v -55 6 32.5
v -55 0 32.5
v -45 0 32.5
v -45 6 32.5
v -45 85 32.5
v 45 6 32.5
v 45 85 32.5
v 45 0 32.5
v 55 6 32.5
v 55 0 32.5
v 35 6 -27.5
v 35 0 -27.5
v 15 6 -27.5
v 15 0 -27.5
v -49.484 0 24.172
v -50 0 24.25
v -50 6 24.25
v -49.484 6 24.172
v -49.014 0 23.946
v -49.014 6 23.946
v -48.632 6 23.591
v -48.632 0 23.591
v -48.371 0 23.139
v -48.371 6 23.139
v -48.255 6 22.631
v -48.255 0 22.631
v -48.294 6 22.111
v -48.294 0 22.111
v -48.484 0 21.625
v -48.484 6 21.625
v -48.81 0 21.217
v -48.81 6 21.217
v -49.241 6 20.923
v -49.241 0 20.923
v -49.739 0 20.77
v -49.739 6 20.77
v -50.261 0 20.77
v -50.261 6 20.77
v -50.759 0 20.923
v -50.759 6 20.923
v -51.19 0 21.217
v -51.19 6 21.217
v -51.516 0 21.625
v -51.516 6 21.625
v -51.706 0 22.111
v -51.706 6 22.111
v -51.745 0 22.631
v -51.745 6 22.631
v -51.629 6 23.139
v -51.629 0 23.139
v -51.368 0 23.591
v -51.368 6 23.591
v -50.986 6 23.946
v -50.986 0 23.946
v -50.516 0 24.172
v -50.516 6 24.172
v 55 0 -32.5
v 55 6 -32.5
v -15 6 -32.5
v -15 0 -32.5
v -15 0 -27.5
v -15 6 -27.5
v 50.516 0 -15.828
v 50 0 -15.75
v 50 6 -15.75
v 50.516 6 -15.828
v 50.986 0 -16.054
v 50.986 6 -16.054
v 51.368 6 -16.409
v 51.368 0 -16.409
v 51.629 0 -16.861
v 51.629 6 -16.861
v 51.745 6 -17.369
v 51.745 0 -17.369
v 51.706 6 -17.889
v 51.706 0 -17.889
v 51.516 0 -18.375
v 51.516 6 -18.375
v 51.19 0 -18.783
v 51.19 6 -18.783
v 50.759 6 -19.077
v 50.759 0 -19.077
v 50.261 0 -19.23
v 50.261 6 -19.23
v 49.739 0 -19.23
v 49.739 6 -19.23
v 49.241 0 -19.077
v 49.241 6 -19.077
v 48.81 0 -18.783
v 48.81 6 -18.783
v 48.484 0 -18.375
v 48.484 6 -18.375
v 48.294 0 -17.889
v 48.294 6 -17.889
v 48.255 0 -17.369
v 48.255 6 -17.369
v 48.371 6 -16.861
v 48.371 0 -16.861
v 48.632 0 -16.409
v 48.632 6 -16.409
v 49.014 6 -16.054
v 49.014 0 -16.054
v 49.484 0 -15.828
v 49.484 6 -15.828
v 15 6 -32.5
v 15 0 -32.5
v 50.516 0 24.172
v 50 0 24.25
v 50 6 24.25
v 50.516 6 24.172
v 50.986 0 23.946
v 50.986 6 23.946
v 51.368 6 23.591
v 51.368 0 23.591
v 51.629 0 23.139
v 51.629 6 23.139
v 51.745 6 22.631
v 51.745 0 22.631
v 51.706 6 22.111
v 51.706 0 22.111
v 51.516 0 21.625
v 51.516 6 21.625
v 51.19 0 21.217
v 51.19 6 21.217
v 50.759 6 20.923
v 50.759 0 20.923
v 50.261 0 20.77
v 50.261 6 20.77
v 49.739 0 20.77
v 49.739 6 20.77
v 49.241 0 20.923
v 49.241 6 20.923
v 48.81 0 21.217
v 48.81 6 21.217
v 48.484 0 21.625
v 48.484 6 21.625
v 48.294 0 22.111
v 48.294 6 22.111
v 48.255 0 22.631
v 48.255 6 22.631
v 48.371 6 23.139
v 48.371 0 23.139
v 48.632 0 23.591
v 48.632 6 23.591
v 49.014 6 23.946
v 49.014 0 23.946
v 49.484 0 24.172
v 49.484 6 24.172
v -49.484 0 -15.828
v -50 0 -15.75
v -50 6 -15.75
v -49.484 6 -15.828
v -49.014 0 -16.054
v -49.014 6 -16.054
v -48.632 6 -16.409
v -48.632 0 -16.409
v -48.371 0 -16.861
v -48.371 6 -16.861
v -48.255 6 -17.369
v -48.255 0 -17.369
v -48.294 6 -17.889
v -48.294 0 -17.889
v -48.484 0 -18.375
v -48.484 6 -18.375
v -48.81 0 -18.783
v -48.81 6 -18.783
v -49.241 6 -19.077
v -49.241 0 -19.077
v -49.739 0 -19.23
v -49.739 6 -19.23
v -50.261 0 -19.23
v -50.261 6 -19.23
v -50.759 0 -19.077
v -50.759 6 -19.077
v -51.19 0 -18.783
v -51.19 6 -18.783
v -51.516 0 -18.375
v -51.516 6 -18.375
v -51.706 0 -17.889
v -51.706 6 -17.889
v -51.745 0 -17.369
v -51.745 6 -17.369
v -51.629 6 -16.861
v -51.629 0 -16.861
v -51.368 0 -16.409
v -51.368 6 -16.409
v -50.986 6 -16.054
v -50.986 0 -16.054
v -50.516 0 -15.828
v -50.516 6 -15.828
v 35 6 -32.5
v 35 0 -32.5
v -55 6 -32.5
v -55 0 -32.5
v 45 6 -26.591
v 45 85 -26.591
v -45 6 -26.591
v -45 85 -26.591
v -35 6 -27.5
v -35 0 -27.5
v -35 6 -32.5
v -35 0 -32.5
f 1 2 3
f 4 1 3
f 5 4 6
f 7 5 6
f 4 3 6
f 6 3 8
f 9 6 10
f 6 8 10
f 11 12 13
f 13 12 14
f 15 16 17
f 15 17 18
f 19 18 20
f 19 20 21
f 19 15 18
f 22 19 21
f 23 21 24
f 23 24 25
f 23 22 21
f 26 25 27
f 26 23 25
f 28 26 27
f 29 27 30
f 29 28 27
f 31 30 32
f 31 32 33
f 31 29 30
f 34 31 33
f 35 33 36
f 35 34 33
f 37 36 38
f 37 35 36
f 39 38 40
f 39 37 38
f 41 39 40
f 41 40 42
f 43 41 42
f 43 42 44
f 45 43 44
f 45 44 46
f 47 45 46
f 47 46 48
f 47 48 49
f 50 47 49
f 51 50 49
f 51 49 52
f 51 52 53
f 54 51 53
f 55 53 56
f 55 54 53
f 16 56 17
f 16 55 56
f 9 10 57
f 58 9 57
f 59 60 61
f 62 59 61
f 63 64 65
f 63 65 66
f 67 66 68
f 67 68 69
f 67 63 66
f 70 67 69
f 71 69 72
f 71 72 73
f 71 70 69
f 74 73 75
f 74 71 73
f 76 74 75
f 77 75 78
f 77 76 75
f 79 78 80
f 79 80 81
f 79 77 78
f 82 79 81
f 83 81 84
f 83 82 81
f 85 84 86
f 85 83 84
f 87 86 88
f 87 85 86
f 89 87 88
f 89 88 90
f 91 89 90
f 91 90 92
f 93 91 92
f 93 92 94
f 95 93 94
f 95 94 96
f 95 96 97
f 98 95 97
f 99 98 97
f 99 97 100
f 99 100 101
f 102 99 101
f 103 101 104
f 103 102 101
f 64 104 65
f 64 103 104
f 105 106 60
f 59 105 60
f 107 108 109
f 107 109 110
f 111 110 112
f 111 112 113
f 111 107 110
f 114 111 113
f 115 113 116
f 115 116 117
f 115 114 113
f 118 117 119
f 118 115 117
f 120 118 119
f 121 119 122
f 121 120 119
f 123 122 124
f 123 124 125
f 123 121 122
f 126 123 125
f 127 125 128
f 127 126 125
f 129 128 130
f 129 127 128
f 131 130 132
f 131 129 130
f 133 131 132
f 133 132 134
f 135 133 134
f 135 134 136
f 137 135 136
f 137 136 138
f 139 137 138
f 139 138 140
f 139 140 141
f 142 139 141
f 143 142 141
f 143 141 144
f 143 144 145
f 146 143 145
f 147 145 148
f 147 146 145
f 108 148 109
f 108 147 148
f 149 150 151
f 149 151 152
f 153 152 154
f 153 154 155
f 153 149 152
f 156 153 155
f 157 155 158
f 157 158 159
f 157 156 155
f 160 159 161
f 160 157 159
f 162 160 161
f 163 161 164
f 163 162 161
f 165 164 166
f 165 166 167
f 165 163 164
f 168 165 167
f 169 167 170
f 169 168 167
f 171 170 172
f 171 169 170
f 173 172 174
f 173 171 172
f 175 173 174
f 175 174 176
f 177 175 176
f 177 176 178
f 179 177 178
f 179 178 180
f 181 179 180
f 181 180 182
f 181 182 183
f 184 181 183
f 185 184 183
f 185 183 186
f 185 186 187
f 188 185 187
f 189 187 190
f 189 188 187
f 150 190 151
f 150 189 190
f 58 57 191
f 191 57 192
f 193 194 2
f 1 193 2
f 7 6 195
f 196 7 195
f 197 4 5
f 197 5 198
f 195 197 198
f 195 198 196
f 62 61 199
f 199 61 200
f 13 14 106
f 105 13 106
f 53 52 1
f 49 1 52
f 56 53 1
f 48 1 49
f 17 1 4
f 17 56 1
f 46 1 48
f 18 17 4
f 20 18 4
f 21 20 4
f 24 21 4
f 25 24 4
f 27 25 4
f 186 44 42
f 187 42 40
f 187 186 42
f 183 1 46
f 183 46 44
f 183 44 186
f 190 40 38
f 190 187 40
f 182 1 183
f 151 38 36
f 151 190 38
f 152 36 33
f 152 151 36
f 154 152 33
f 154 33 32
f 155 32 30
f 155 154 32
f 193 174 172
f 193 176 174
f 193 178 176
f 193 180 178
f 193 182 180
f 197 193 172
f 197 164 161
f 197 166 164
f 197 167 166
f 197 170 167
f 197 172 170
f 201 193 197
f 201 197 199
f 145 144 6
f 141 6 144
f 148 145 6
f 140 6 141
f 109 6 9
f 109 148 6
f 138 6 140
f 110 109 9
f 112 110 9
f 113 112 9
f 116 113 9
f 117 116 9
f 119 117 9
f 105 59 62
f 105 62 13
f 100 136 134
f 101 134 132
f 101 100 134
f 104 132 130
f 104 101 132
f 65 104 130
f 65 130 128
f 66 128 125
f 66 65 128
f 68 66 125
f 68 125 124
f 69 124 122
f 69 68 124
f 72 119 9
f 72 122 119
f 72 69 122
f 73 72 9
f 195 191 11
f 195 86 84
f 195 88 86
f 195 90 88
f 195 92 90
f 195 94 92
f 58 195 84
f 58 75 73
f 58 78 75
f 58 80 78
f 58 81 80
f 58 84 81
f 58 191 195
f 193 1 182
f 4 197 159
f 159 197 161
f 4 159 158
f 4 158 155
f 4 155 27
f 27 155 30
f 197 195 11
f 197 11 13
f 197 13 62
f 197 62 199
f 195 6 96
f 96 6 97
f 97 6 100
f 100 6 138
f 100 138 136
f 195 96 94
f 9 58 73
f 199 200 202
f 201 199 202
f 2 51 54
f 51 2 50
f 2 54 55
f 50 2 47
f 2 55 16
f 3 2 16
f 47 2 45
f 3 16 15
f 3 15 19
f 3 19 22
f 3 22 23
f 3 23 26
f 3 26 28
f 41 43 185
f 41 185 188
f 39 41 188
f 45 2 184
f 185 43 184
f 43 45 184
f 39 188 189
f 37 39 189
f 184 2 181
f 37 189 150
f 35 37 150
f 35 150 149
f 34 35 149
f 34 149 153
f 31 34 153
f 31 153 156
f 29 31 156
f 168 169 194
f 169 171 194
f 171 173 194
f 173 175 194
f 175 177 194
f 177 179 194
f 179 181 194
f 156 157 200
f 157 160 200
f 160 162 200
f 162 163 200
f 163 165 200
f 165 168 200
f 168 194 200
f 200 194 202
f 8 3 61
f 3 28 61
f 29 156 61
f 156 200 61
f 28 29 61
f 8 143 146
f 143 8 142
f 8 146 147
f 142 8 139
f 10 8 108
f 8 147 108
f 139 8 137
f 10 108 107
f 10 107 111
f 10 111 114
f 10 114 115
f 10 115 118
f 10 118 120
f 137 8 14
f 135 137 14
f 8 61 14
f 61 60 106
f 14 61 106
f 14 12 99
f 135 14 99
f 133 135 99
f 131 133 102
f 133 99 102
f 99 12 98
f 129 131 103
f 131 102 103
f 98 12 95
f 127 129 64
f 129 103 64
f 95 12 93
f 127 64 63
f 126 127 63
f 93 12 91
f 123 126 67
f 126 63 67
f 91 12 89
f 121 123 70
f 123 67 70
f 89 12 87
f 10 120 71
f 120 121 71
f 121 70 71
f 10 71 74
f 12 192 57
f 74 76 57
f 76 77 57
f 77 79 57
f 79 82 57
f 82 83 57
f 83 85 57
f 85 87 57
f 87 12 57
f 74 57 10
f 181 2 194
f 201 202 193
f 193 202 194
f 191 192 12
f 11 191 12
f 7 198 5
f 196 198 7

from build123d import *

# Parameters (mm, degrees)
SKETCH1_R           = 1.75
BOSS_EXTRUDE1_DEPTH = 6
SKETCH1_3_W         = 90
SKETCH1_3_H         = 59.090909091
BOSS_EXTRUDE2_DEPTH = 85


with BuildPart() as part:
    # Sketch1 → Boss-Extrude1 (new body)
    with BuildSketch(Plane(origin=(0, 0, 0), x_dir=(1, 0, 0), z_dir=(0, 1, 0))):
        Polygon((-35, 27.5), (-35, 32.5), (-55, 32.5), (-55, -32.5), (-45, -32.5), (-45, 26.590909091), (45, 26.590909091), (45, -32.5), (55, -32.5), (55, 32.5), (35, 32.5), (35, 27.5), (15, 27.5), (15, 32.5), (-15, 32.5), (-15, 27.5), align=None)
        with Locations((-50, -22.5)):
            Circle(SKETCH1_R, mode=Mode.SUBTRACT)
        with Locations((50, -22.5)):
            Circle(SKETCH1_R, mode=Mode.SUBTRACT)
        with Locations((-50, 17.5)):
            Circle(SKETCH1_R, mode=Mode.SUBTRACT)
        with Locations((50, 17.5)):
            Circle(SKETCH1_R, mode=Mode.SUBTRACT)
    extrude(amount=BOSS_EXTRUDE1_DEPTH)

    # Sketch1<3> → Boss-Extrude2 (add)
    with BuildSketch(Plane(origin=(0, 0, 0), x_dir=(1, 0, 0), z_dir=(0, 1, 0))):
        with Locations((0, -2.954545454)):
            Rectangle(SKETCH1_3_W, SKETCH1_3_H)
    extrude(amount=BOSS_EXTRUDE2_DEPTH)


solid = part.part
